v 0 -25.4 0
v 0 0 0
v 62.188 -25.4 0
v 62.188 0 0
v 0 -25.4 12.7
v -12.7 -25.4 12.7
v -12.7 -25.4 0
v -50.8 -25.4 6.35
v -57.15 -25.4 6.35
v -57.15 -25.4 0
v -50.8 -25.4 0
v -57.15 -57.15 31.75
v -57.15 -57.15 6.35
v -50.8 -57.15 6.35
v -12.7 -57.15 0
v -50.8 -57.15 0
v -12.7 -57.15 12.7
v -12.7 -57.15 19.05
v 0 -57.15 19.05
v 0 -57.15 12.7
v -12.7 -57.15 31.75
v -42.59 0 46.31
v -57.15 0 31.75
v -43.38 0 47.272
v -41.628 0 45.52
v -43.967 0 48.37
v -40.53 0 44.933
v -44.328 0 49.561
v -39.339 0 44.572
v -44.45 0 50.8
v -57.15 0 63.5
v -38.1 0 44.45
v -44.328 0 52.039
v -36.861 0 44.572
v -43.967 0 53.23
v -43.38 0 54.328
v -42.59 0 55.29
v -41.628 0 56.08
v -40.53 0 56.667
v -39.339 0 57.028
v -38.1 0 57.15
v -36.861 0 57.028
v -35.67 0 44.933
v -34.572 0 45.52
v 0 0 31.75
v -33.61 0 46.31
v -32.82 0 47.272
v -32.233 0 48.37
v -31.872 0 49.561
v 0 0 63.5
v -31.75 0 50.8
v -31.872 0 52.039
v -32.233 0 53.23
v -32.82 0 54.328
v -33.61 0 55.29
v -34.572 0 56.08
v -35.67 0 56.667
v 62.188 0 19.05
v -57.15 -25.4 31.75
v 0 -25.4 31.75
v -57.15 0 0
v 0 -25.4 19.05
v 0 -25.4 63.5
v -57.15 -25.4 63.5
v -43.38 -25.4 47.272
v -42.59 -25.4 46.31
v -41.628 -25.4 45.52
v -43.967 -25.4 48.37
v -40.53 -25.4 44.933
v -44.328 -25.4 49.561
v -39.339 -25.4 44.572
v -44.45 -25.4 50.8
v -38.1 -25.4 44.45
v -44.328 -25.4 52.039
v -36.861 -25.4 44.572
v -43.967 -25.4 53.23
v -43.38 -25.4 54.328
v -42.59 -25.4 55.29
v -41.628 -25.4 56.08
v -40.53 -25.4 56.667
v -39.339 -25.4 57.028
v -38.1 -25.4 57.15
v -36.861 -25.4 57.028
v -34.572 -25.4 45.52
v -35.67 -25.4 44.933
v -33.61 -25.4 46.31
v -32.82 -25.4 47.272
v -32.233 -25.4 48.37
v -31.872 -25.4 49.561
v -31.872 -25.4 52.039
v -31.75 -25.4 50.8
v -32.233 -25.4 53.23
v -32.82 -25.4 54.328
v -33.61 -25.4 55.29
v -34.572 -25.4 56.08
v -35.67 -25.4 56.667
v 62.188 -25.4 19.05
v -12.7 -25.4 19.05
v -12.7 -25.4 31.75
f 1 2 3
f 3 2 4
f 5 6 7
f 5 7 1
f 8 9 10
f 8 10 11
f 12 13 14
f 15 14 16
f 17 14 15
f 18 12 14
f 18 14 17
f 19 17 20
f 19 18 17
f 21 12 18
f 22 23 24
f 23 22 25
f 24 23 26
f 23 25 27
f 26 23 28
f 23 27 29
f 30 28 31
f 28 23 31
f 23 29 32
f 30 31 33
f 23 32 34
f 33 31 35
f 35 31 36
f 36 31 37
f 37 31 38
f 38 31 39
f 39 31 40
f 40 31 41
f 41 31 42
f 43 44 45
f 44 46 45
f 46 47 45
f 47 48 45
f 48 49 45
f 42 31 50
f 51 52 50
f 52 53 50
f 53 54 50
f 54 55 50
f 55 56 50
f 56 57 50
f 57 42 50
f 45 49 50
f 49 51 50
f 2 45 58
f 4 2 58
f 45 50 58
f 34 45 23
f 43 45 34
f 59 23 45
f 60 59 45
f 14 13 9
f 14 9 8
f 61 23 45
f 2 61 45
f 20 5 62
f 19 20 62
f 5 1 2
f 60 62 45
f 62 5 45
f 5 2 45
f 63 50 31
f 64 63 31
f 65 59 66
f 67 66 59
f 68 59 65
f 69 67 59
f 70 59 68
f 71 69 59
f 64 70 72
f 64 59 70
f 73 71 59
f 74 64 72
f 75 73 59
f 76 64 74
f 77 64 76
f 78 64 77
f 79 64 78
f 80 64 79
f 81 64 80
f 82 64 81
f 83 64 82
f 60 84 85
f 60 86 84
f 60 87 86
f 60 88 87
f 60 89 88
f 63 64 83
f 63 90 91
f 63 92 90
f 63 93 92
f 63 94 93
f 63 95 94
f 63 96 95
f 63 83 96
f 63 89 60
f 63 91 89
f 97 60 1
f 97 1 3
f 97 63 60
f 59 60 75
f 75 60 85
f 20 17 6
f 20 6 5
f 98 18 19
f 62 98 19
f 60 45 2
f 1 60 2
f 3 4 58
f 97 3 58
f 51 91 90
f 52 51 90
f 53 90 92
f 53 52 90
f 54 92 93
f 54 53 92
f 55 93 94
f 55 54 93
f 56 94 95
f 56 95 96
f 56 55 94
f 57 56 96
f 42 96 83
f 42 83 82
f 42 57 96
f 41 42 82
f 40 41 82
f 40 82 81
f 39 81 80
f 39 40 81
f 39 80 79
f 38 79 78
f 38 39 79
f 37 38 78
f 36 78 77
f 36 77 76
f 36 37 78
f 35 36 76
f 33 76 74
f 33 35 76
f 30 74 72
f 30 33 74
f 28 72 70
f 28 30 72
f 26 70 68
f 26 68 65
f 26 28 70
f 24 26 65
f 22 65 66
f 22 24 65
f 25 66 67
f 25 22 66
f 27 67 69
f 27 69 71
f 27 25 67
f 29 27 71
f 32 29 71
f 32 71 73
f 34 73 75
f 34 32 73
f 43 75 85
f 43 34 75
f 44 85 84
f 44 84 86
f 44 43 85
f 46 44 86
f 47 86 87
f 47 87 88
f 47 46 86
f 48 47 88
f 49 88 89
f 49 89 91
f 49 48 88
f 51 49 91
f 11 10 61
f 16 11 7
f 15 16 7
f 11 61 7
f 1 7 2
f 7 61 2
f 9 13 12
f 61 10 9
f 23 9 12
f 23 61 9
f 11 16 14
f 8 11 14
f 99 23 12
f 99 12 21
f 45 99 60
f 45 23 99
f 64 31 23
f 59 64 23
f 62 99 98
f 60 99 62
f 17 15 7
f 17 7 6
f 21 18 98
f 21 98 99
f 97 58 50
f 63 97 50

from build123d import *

# Parameters (mm, degrees)
F0_R     = 6.35
F1_DEPTH = 25.4
F0_W     = 57.15
F0_H     = 31.75
F2_DEPTH = 57.15
F3_W     = 6.35
F3_H     = 6.35
F3_W_2   = 12.7
F3_H_2   = 12.7
F4_DEPTH = 31.75


with BuildPart() as f1:
    # F0 (on Front) → F1 (new body)
    with BuildSketch(Plane.XZ):
        Polygon((-57.15, 63.5), (-57.15, 31.75), (0, 31.75), (0, 0), (62.187869, 0), (62.187869, 19.05), (0, 63.5), align=None)
        with Locations((-38.1, 50.8)):
            Circle(F0_R, mode=Mode.SUBTRACT)
    extrude(amount=F1_DEPTH)


with BuildPart() as f2:
    # F0 (on Front) → F2 (new body)
    with BuildSketch(Plane.XZ):
        with Locations((-28.575, 15.875)):
            Rectangle(F0_W, F0_H)
    extrude(amount=F2_DEPTH)

    # F3 (on face) → F4 (cut)
    with BuildSketch(Plane.XZ.offset(57.15)):
        with Locations((-53.975, 3.175)):
            Rectangle(F3_W, F3_H)
        with Locations((-6.35, 25.4)):
            Rectangle(F3_W_2, F3_H_2)
        with Locations((-6.35, 6.35)):
            Rectangle(F3_W_2, F3_H_2)
    extrude(amount=-F4_DEPTH, mode=Mode.SUBTRACT)


solid = Compound([f1.part, f2.part])
